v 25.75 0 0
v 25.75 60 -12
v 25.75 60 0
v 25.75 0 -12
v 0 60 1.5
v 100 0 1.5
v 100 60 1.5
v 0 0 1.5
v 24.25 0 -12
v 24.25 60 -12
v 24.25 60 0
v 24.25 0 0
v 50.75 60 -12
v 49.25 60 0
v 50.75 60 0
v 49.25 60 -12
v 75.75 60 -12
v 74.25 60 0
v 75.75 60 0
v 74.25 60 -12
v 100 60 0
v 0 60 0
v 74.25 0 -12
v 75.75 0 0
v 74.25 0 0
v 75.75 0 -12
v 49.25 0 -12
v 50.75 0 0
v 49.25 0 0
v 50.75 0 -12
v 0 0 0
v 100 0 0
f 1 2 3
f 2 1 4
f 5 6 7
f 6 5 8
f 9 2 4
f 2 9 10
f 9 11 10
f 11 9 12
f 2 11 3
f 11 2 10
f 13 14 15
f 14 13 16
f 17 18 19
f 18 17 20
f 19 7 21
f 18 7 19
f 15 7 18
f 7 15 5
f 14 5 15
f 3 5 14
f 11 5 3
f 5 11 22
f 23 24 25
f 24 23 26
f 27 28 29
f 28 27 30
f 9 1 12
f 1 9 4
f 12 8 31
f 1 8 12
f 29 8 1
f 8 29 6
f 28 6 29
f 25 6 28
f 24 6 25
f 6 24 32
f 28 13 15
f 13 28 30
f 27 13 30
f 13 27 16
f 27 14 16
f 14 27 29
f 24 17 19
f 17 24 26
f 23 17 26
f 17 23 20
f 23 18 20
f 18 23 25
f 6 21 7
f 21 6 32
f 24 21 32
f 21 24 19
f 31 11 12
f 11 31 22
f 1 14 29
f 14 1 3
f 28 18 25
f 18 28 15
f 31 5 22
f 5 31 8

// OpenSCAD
$fn = 32;

// ----------------------------------------------------------------------
// Ribbed panel: 1.5 mm panel
// ----------------------------------------------------------------------

// --- parameters (mm) ---
panel_l = 100;            // panel length, X
panel_w = 60;             // panel width, Y
panel_t = 1.5;            // panel thickness, Z
rib_t = 1.5;              // rib thickness
rib_h = 12;               // rib height below the panel
ribs = 3;                 // number of ribs

total_h = panel_t + rib_h;  // overall height

union() {
  cube([panel_l, panel_w, panel_t]);
  for (i = [1 : ribs])
    translate([i * panel_l / (ribs + 1) - rib_t / 2, 0, -rib_h])
      cube([rib_t, panel_w, rib_h + panel_t]);
}
